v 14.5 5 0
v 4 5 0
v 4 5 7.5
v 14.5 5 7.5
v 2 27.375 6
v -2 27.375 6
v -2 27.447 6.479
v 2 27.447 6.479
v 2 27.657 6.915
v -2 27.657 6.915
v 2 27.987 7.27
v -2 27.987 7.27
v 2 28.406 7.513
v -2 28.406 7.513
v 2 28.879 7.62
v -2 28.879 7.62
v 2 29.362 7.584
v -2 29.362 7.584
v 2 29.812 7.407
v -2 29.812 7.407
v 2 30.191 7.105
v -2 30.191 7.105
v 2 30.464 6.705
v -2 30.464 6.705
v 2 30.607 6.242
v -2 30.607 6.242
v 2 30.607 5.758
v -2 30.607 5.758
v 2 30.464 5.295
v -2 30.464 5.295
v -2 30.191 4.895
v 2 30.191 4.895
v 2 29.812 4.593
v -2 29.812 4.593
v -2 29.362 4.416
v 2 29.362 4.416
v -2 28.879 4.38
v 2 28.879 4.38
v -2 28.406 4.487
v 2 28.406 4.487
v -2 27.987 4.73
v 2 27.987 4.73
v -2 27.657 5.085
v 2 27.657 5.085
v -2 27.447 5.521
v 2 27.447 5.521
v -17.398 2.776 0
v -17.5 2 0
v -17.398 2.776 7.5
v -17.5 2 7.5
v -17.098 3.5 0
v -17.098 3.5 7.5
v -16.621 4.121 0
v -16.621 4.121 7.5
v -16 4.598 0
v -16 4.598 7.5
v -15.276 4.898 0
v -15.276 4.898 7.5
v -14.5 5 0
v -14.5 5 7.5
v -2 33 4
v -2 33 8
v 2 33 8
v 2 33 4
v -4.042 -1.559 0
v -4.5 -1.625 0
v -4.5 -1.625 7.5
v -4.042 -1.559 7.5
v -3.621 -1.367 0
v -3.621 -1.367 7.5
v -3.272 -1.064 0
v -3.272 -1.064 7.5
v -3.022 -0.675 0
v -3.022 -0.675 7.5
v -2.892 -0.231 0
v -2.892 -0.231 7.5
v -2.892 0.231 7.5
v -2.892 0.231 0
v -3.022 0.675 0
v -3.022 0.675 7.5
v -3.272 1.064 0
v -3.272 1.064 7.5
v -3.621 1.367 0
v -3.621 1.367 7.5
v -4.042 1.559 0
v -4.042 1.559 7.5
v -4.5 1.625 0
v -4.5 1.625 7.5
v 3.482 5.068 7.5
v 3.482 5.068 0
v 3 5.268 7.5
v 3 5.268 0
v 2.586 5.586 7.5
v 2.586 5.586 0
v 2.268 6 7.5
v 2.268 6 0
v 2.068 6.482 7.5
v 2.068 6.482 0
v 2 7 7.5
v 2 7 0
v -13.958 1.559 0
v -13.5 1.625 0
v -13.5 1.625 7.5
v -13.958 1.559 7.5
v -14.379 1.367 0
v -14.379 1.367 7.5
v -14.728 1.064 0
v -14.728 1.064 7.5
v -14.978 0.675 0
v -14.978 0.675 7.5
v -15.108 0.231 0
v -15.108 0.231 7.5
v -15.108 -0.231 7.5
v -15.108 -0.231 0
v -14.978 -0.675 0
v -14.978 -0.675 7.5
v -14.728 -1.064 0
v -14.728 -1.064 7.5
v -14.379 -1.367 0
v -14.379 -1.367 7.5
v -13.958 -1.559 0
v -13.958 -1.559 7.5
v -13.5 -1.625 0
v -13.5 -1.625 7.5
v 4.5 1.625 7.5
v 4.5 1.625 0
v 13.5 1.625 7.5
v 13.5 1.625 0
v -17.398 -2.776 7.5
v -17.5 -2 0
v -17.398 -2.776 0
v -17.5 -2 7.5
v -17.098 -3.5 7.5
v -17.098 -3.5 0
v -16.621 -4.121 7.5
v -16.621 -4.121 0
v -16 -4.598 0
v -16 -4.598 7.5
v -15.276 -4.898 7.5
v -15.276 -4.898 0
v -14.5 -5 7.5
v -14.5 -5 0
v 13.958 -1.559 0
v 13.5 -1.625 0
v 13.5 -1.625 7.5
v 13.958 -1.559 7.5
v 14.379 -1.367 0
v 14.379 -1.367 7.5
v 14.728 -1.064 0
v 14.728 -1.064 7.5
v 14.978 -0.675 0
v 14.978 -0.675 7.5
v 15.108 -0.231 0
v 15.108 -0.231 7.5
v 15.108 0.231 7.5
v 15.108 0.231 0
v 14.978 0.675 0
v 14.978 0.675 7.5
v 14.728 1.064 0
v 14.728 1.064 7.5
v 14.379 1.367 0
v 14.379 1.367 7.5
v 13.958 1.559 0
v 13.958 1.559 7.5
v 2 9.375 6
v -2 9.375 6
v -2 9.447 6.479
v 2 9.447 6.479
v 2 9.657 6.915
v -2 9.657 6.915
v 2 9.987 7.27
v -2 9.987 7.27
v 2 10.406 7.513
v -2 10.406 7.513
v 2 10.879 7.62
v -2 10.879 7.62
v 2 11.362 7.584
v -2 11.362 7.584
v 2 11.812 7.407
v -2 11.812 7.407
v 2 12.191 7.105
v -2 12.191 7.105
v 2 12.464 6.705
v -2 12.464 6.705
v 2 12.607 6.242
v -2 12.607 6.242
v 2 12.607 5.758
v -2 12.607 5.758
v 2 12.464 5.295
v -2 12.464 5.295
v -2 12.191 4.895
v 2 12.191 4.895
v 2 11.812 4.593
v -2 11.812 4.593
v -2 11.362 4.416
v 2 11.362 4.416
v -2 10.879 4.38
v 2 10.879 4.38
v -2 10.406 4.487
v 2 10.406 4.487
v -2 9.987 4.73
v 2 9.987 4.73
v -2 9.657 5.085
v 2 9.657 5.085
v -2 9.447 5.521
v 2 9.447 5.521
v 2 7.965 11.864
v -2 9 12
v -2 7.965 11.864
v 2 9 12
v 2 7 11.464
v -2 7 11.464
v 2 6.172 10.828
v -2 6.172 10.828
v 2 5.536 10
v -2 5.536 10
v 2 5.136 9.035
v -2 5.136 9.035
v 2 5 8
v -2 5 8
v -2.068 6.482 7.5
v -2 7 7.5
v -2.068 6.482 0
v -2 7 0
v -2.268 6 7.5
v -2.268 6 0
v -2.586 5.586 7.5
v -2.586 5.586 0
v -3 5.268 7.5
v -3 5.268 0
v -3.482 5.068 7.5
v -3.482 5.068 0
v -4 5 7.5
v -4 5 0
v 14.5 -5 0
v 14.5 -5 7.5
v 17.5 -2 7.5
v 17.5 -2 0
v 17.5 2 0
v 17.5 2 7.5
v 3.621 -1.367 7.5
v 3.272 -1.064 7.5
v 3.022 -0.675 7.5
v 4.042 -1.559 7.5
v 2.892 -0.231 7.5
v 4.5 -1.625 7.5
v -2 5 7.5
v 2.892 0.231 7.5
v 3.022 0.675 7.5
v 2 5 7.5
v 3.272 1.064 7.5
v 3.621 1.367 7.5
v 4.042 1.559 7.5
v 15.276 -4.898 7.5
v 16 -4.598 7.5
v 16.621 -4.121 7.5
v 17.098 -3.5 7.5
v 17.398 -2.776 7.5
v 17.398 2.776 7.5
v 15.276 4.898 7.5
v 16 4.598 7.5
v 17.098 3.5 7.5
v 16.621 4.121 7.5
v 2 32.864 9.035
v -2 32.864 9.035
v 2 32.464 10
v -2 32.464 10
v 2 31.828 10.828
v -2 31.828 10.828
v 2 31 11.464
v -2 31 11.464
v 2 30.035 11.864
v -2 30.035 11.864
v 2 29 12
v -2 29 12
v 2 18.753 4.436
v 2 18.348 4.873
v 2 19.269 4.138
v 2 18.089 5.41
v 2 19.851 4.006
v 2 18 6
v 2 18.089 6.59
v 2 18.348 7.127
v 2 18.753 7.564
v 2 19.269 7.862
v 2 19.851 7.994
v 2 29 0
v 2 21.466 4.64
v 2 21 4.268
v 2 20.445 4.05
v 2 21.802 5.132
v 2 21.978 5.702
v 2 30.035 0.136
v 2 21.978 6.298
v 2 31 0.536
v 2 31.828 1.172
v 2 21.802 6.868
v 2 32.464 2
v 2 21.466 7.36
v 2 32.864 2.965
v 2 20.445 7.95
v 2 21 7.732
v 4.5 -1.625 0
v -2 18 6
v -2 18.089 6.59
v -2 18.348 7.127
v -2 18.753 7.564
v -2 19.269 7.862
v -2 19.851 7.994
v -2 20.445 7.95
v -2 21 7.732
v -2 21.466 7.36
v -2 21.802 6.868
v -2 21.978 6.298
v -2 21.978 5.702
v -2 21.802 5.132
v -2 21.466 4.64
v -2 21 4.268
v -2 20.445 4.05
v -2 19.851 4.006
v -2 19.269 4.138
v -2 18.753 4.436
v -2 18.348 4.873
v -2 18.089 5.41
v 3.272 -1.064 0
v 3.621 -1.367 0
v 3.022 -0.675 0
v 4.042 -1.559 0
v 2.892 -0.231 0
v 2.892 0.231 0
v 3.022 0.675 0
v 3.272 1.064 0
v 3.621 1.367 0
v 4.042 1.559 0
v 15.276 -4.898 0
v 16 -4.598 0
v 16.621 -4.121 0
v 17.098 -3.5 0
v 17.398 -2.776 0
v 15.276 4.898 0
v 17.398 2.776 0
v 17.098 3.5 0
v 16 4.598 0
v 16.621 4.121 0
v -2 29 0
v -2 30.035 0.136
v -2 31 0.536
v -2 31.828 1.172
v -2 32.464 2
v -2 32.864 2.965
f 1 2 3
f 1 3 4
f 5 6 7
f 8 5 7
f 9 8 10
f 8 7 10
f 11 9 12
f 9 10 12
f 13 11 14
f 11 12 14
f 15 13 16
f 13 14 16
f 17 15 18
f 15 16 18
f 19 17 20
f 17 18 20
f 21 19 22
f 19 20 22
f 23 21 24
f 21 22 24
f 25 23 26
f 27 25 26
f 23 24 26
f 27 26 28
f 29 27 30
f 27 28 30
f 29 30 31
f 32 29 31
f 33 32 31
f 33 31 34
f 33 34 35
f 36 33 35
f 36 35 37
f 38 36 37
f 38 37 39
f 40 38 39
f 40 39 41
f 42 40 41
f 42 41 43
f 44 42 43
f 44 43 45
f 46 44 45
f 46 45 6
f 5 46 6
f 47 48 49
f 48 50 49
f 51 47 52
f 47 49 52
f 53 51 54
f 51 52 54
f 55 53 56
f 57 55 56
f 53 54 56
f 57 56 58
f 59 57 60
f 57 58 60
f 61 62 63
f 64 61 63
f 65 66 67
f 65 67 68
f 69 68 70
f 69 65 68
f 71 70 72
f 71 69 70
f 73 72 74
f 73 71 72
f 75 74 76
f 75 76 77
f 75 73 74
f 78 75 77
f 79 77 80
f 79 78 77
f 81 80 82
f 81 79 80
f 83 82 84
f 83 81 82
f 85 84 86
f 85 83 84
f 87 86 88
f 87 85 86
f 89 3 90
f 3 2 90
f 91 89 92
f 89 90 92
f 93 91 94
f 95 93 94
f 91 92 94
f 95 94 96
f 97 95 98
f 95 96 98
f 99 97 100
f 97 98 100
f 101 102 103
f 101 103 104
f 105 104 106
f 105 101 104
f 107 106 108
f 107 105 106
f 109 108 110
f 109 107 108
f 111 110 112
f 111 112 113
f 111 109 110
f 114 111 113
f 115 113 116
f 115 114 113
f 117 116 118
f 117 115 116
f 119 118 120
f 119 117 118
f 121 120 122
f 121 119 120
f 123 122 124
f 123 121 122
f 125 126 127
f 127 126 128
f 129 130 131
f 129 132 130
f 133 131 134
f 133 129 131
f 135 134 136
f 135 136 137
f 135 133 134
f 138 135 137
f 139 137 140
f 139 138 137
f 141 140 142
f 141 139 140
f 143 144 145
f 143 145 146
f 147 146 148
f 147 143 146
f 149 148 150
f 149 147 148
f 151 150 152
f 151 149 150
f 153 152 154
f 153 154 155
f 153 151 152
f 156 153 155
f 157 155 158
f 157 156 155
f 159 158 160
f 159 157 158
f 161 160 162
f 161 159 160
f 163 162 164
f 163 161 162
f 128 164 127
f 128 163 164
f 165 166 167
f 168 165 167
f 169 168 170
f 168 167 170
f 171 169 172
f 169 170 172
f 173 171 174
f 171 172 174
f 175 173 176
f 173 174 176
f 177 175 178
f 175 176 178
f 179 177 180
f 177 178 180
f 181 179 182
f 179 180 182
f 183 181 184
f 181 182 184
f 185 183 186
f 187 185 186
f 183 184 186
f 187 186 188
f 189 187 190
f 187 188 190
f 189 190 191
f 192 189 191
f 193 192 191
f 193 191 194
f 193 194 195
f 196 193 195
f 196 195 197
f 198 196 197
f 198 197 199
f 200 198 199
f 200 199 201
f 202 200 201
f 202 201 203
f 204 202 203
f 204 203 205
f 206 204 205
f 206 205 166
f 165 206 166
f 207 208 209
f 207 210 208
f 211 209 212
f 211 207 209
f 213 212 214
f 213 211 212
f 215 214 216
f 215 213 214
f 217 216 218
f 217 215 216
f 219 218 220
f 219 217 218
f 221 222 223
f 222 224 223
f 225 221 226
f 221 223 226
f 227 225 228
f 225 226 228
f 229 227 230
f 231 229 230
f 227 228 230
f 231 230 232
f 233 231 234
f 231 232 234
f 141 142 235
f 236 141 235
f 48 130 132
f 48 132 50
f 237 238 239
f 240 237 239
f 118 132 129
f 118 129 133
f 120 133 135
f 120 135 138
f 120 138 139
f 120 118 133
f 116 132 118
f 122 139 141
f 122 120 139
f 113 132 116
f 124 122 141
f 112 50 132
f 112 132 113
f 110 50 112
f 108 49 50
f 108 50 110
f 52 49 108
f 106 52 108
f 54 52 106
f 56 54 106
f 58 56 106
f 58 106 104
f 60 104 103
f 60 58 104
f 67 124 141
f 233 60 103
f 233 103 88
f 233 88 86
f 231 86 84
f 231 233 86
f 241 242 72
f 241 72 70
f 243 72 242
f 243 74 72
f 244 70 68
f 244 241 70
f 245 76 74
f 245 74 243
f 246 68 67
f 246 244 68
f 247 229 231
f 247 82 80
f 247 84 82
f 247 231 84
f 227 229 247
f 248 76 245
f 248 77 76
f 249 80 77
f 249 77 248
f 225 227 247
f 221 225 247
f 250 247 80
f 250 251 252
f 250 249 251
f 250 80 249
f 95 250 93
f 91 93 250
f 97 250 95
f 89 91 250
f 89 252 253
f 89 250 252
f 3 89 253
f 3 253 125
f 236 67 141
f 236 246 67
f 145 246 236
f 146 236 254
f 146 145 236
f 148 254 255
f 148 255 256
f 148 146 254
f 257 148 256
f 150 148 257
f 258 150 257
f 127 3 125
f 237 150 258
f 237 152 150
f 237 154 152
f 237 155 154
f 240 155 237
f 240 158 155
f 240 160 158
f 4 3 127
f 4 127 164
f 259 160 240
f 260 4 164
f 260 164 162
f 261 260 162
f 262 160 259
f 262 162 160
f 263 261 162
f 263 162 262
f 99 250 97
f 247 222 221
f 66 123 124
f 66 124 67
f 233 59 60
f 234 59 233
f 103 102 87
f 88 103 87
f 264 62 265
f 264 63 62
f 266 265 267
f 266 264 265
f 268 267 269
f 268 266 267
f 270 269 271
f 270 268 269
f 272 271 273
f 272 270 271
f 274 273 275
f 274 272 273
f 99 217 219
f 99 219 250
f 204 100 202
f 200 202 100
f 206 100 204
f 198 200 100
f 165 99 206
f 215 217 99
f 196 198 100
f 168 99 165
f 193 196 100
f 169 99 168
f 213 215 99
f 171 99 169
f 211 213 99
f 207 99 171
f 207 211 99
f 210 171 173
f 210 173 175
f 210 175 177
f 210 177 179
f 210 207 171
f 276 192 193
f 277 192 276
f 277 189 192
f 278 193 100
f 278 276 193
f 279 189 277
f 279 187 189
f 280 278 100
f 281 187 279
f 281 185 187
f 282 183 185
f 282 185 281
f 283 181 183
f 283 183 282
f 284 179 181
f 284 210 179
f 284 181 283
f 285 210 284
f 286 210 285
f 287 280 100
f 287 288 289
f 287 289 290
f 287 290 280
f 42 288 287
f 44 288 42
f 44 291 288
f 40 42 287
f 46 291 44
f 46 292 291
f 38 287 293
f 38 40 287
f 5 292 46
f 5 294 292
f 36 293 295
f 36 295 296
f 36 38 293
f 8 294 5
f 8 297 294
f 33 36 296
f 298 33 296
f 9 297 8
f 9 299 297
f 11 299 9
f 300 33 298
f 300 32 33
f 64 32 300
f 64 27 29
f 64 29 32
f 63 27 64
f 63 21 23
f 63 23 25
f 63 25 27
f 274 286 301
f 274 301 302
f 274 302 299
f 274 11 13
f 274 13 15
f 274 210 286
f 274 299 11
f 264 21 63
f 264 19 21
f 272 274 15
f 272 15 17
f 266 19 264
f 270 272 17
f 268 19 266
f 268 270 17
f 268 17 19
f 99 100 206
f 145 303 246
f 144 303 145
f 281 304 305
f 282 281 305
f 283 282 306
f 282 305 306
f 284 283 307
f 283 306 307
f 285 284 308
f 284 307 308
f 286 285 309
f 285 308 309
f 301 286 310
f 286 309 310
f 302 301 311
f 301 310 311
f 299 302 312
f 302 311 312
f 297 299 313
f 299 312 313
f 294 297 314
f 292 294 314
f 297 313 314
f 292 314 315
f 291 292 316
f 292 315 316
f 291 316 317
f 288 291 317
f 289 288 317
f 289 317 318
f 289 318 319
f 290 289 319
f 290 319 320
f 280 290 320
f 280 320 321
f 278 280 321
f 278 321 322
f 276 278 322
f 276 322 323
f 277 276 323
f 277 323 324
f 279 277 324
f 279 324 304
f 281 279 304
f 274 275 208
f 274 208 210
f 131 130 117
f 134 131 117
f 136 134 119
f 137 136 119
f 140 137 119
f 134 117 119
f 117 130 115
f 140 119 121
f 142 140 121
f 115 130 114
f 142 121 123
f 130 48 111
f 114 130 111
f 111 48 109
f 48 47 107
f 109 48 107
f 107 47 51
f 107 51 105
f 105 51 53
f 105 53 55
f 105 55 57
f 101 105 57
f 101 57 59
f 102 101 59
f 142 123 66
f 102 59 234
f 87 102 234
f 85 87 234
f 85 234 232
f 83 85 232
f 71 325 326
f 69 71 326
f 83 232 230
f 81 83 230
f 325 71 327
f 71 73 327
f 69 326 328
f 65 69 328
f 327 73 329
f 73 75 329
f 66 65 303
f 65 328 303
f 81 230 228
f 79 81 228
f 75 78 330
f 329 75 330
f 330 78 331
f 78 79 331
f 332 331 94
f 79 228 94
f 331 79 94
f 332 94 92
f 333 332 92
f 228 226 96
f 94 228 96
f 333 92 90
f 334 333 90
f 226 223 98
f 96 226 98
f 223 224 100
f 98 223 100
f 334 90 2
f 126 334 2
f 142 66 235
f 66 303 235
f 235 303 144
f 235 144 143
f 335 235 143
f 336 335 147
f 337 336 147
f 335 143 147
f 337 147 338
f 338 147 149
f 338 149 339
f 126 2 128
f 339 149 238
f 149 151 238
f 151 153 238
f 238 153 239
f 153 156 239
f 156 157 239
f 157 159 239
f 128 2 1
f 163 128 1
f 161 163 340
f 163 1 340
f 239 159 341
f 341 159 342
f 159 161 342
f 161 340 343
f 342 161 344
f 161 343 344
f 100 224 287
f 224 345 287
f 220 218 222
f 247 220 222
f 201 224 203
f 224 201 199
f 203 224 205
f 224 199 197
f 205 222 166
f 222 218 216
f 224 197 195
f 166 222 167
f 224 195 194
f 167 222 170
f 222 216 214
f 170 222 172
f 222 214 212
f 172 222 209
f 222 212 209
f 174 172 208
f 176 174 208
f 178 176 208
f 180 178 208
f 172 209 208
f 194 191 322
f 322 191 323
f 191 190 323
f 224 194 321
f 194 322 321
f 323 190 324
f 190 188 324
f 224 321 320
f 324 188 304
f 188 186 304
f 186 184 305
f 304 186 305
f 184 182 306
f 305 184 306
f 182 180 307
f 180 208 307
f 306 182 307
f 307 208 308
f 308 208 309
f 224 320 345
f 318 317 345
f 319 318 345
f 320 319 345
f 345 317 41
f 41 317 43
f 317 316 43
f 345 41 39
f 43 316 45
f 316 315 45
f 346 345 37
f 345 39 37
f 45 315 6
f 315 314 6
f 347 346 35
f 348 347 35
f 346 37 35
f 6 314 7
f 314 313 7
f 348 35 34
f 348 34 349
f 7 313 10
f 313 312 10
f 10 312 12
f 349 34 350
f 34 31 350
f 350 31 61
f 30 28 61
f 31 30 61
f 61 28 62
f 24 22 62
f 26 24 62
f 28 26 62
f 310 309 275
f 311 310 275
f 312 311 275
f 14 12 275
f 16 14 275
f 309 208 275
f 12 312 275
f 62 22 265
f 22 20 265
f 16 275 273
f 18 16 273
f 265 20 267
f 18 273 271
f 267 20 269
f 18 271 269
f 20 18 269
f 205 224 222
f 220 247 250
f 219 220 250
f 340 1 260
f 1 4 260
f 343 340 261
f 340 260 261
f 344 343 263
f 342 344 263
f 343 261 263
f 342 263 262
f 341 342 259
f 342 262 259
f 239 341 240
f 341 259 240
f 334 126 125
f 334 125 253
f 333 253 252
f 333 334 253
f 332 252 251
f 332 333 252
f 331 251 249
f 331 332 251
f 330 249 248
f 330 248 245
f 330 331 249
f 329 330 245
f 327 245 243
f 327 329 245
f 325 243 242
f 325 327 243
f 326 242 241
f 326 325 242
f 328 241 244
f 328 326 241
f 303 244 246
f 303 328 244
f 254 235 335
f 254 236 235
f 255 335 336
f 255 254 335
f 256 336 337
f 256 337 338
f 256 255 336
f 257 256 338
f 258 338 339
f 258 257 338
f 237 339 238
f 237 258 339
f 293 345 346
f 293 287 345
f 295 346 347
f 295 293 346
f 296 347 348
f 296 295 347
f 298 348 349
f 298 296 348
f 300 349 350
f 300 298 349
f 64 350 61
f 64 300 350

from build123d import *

# Parameters (mm, degrees)
SKETCH_W          = 35
SKETCH_H          = 10
PAD_DEPTH         = 7.5
FILLET_R          = 3
SKETCH002_W       = 4
SKETCH002_H       = 28
PAD001_DEPTH      = 4.5
PAD001_DEPTH_BACK = 7.5
FILLET001_R       = 2
SKETCH003_R       = 1.625
SKETCH003_R_2     = 2
POCKET_DEPTH      = 19.501
FILLET002_R       = 4


with BuildPart() as part:
    # Sketch → Pad (new body)
    with BuildSketch(Plane.XY):
        Rectangle(SKETCH_W, SKETCH_H)
        with BuildLine():
            ThreePointArc((-13.5, 1.625), (-15.125, 0), (-13.5, -1.625))
            Line((-13.5, -1.625), (-4.5, -1.625))
            ThreePointArc((-4.5, -1.625), (-2.875, 0), (-4.5, 1.625))
            Line((-13.5, 1.625), (-4.5, 1.625))
        make_face(mode=Mode.SUBTRACT)
        with BuildLine():
            ThreePointArc((4.5, 1.625), (2.875, 0), (4.5, -1.625))
            Line((4.5, -1.625), (13.5, -1.625))
            ThreePointArc((13.5, -1.625), (15.125, 0), (13.5, 1.625))
            Line((4.5, 1.625), (13.5, 1.625))
        make_face(mode=Mode.SUBTRACT)
    extrude(amount=PAD_DEPTH)

    # Fillet
    fillet_edges = [part.edges().sort_by_distance(p)[0] for p in [
        (-17.5, 5, 3.75),
        (-17.5, -5, 3.75),
        (17.5, -5, 3.75),
        (17.5, 5, 3.75),
    ]]
    fillet(fillet_edges, radius=FILLET_R)

    # Sketch002 (on Face5 of Fillet) → Pad001 (join, two sides)
    with BuildSketch(Plane.XY.offset(7.5)) as pad001_sk:
        with Locations((0, 19)):
            Rectangle(SKETCH002_W, SKETCH002_H)
    extrude(amount=PAD001_DEPTH)
    extrude(pad001_sk.sketch, amount=-PAD001_DEPTH_BACK)

    # Fillet001
    fillet001_edges = [part.edges().sort_by_distance(p)[0] for p in [
        (2, 5, 3.75),
        (-2, 5, 3.75),
    ]]
    fillet(fillet001_edges, radius=FILLET001_R)

    # Sketch003 (on Face22 of Fillet001) → Pocket (cut, through all)
    with BuildSketch(Plane(origin=(-2, 0, 0), x_dir=(0, -1, 0), z_dir=(-1, 0, 0))):
        with Locations((-29, 6)):
            Circle(SKETCH003_R)
        with Locations((-11, 6)):
            Circle(SKETCH003_R)
        with Locations((-20, 6)):
            Circle(SKETCH003_R_2)
    extrude(amount=-POCKET_DEPTH, mode=Mode.SUBTRACT)

    # Fillet002
    fillet002_edges = [part.edges().sort_by_distance(p)[0] for p in [
        (0, 33, 0),
        (0, 33, 12),
        (0, 5, 12),
    ]]
    fillet(fillet002_edges, radius=FILLET002_R)


solid = part.part
